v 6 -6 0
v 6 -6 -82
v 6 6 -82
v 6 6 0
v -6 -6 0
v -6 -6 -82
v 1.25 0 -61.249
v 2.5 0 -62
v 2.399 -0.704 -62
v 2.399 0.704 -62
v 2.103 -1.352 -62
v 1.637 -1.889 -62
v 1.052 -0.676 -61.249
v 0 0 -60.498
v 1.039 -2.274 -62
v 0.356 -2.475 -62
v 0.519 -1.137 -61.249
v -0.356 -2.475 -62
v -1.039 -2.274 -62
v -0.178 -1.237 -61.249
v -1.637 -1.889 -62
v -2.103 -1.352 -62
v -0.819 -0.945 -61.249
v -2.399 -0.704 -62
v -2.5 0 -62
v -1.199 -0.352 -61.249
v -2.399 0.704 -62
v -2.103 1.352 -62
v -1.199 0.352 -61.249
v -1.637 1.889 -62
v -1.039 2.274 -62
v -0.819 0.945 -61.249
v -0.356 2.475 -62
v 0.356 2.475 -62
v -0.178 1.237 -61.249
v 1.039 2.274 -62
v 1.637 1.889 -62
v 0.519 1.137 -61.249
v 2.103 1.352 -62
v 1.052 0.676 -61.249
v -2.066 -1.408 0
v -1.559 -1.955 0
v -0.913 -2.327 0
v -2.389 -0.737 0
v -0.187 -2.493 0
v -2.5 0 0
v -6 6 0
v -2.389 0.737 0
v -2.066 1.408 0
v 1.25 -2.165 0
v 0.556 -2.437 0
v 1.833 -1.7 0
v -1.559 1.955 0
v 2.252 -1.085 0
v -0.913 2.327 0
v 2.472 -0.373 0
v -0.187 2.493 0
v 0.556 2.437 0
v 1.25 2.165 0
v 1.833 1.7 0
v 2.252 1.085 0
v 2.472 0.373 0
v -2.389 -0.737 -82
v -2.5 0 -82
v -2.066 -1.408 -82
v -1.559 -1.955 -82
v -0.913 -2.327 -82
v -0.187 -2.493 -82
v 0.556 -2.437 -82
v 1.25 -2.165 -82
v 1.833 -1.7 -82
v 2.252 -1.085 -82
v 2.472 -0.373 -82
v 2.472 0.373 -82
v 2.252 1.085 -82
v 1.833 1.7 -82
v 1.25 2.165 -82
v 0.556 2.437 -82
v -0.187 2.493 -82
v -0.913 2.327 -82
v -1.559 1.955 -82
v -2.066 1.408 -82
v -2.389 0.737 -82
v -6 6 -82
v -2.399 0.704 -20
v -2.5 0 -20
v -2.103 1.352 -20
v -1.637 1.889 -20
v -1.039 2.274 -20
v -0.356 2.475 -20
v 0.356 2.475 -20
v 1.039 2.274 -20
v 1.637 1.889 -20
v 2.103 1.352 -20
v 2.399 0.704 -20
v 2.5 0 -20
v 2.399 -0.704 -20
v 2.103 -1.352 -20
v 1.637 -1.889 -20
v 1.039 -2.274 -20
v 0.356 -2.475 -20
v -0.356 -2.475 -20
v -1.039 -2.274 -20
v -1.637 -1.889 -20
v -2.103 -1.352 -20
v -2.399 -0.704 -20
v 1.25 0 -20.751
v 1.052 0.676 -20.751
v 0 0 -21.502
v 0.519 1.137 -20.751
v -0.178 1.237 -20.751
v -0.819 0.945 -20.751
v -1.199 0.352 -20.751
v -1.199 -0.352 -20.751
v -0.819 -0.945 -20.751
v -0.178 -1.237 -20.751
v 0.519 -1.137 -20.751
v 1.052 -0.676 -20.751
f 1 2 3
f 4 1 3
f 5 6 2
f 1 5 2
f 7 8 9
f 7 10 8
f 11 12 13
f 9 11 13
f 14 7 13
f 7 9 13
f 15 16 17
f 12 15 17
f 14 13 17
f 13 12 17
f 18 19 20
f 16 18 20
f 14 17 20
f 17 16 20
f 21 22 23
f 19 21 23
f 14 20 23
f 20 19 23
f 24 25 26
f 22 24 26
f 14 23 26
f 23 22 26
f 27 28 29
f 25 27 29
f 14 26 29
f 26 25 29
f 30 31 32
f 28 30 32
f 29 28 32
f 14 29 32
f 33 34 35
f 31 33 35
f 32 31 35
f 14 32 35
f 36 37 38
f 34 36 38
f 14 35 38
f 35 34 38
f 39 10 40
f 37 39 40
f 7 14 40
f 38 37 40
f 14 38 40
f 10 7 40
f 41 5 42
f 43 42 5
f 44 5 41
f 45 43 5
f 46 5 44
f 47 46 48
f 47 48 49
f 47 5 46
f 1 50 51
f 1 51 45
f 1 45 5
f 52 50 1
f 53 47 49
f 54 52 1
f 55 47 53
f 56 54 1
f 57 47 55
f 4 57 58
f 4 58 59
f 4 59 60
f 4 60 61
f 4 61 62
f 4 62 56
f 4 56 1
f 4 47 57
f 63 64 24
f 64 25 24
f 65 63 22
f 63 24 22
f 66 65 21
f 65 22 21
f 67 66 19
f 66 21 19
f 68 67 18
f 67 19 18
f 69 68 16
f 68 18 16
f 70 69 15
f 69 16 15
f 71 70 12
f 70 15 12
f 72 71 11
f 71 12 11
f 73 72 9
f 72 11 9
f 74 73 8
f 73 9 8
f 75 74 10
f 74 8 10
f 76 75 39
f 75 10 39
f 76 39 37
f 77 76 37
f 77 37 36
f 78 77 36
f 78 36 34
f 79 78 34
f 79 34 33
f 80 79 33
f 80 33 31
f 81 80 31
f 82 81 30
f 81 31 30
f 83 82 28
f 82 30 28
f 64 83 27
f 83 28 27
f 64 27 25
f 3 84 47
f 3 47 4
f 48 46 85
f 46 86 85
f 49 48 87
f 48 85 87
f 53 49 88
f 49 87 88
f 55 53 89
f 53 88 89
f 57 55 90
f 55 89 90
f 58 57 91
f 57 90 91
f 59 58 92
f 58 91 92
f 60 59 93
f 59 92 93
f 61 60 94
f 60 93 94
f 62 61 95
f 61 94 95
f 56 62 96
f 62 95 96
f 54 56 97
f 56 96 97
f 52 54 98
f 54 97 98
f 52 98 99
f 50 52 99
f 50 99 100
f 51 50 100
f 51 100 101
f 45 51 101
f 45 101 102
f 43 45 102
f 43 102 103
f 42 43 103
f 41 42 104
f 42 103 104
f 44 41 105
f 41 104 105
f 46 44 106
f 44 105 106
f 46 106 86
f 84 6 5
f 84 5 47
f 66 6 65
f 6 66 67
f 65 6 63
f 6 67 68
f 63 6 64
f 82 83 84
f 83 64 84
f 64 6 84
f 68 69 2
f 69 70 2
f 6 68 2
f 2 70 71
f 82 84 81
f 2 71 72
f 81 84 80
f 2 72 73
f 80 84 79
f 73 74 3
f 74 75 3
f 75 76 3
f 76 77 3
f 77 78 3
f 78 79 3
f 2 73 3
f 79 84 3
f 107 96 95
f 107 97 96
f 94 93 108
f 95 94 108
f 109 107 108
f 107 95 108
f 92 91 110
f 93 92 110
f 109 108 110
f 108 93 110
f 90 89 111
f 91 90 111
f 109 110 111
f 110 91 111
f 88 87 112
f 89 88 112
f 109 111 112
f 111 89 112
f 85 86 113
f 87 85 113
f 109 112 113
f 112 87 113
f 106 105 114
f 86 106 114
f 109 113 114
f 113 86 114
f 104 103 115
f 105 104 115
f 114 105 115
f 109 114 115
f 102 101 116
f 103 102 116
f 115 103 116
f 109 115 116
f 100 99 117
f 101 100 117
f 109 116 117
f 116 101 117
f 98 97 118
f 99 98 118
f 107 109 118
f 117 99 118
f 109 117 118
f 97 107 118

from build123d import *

# Parameters (mm, degrees)
F0_W     = 12
F0_H     = 12
F1_DEPTH = 82
F3_D     = 5
F3_DEPTH = 20
F3_TIP   = 1.5021515476
F5_D     = 5
F5_DEPTH = 20
F5_TIP   = 1.5021515476


with BuildPart() as f1:
    # F0 (on Top) → F1 (new body)
    with BuildSketch(Plane.XY):
        Rectangle(F0_W, F0_H)
    extrude(amount=-F1_DEPTH)

    # F3
    with Locations(Plane.XY):
        with Locations((0, 0)):
            Hole(F3_D / 2, depth=F3_DEPTH)
            with Locations((0, 0, -(F3_DEPTH + F3_TIP / 2))):  # 118° drill point
                Cone(0, F3_D / 2, F3_TIP, mode=Mode.SUBTRACT)

    # F5
    with Locations(Plane(origin=(0, 0, -82), x_dir=(1, 0, 0), z_dir=(0, 0, -1))):
        with Locations((0, 0)):
            Hole(F5_D / 2, depth=F5_DEPTH)
            with Locations((0, 0, -(F5_DEPTH + F5_TIP / 2))):  # 118° drill point
                Cone(0, F5_D / 2, F5_TIP, mode=Mode.SUBTRACT)


solid = f1.part
